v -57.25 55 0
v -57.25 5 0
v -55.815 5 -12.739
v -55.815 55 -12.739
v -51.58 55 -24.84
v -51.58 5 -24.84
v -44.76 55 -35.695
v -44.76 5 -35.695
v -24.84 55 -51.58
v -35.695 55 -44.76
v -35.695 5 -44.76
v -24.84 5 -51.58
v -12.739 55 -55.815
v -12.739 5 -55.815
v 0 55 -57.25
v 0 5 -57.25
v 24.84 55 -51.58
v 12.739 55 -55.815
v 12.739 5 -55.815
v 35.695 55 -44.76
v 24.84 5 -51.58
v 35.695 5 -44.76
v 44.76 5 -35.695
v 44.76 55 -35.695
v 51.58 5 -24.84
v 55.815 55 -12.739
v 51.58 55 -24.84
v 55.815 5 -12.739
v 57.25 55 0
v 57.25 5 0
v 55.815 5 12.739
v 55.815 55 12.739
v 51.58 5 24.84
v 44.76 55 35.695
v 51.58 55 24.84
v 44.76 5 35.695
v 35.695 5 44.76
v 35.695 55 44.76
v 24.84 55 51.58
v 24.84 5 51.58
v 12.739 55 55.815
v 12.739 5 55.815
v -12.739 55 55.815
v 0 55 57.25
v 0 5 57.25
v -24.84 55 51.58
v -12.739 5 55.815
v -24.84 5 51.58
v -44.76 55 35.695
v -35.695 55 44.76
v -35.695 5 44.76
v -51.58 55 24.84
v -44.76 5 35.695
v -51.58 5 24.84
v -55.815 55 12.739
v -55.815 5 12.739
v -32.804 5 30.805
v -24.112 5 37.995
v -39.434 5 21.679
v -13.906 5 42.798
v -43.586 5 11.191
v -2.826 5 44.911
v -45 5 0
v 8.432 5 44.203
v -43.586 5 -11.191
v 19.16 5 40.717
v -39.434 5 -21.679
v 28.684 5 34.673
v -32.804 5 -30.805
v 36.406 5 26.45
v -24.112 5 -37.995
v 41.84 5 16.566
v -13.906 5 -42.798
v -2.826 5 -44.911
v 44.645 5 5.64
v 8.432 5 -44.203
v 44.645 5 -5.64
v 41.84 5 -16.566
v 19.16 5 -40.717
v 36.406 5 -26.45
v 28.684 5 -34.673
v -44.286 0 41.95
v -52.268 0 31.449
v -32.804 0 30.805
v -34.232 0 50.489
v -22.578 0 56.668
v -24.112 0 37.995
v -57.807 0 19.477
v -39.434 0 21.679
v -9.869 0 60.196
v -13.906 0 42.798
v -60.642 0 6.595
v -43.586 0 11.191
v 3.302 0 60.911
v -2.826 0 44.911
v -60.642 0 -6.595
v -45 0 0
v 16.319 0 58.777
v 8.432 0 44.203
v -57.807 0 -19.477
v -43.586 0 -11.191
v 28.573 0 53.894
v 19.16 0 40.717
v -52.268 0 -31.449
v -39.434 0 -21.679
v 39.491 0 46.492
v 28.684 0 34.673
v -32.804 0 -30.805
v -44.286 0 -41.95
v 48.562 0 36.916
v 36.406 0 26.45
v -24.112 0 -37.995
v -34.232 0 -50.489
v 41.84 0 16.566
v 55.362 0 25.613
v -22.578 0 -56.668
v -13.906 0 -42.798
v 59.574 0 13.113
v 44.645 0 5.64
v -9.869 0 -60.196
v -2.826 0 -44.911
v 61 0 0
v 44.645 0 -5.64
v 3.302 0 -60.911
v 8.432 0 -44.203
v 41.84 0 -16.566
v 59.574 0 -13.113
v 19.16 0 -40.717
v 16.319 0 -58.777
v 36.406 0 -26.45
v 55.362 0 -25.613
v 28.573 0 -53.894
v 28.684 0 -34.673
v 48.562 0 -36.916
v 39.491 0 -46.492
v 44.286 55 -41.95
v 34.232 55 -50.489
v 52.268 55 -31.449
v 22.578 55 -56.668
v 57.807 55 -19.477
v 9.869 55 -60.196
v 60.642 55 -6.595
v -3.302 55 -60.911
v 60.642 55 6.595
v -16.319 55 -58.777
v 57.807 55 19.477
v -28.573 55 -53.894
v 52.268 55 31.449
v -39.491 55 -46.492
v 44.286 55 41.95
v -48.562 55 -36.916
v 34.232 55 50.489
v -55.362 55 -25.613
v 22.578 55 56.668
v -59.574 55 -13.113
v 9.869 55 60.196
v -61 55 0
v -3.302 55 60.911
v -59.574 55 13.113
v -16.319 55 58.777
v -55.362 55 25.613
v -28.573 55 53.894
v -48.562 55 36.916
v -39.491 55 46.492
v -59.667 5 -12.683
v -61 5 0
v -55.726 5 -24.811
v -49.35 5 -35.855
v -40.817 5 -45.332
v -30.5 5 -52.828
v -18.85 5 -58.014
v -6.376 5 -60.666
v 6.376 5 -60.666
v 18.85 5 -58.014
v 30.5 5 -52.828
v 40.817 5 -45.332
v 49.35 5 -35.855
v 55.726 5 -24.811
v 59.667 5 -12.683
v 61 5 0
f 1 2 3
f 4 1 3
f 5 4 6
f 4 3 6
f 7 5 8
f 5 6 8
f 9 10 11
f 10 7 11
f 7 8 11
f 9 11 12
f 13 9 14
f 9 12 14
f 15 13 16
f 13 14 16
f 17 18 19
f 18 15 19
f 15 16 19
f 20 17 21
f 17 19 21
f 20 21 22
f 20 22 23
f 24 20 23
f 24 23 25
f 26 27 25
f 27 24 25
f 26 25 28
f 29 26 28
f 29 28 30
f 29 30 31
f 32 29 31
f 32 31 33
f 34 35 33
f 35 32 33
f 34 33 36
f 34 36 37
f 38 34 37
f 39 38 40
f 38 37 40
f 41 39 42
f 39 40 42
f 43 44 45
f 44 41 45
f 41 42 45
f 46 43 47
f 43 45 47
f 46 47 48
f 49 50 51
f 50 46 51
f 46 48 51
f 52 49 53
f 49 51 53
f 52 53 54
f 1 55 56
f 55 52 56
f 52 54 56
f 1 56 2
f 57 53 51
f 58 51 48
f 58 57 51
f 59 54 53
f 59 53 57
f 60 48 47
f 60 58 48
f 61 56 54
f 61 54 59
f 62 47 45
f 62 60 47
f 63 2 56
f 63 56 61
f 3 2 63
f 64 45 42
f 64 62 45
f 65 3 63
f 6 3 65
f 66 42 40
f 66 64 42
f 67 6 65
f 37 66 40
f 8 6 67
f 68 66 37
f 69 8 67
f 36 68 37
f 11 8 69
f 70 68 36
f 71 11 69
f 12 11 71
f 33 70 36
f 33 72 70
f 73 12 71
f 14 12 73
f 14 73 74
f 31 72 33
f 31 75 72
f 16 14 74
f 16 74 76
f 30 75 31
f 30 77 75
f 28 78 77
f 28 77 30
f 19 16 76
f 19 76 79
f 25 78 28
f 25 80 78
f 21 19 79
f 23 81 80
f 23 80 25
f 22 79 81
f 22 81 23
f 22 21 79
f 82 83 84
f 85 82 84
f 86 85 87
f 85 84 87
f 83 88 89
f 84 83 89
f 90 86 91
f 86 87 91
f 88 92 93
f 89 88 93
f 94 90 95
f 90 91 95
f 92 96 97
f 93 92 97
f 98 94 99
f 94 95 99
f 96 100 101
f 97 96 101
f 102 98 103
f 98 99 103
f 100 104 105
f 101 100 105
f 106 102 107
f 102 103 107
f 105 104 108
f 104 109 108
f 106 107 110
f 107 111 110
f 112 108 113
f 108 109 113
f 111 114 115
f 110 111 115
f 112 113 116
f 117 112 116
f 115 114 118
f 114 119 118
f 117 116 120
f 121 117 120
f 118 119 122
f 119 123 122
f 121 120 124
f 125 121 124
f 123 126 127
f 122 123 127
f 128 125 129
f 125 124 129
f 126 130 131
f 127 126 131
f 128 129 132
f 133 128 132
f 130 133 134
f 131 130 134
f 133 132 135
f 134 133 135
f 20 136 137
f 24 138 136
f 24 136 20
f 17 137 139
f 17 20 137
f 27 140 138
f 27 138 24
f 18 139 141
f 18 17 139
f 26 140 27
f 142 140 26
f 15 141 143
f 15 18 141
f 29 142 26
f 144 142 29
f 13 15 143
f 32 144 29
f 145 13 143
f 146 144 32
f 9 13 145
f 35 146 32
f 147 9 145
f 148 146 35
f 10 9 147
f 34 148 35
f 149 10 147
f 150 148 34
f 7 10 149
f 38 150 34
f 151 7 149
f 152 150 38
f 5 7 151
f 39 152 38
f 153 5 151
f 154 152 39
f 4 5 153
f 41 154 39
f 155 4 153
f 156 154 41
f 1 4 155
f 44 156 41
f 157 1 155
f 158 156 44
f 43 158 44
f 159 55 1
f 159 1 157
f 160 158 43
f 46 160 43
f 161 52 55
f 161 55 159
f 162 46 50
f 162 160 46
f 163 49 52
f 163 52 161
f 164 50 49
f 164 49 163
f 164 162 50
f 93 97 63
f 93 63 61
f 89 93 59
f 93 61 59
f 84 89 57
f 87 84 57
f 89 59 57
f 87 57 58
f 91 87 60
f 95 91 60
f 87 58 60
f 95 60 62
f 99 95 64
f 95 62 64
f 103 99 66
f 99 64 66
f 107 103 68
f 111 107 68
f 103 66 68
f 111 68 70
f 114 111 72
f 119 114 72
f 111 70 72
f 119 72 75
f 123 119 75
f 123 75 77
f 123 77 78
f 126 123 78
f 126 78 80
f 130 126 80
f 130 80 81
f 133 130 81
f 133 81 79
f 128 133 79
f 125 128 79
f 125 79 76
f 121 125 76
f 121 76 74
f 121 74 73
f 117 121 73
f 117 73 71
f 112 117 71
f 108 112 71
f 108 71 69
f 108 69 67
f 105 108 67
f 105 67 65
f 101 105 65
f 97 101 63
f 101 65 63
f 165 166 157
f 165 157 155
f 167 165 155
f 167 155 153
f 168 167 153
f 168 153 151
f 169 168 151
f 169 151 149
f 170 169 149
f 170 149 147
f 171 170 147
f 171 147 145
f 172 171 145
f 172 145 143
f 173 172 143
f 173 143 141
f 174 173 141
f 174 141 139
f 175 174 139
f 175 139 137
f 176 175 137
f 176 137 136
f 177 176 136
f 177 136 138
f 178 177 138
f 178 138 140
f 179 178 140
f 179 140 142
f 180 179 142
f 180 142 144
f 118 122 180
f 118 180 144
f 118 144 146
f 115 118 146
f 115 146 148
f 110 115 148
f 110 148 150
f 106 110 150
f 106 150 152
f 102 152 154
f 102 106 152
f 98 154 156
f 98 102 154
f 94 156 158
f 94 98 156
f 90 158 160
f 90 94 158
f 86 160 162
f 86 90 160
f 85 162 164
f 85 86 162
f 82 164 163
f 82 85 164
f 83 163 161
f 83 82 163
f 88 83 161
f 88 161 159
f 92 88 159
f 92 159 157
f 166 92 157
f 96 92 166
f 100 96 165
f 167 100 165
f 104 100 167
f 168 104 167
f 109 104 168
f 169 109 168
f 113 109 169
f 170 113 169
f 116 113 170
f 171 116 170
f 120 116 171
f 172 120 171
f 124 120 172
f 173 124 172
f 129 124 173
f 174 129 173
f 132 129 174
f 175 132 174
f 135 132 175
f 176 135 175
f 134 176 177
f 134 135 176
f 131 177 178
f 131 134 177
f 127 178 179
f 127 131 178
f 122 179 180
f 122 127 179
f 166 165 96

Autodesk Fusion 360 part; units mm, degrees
sketch "Sketch1" plane through (0, 0, 0) normal (0, 1, 0) x (1, 0, 0)
  circle A0 centre (0, 0) radius 61
  dimension "d2" = 122
extrude "Extrude1" add sketch "Sketch1" along normal blind 5
sketch "Sketch3" plane through (0, 5, 0) normal (0, 1, 0) x (-1, 0, 0)
  circle A0 centre (0, 0) radius 61
  circle A1 centre (0, 0) radius 61
  circle A2 centre (0, 0) radius 57.25
  dimension "d5" = 114.5
extrude "Extrude2" add sketch "Sketch3" along normal blind 50
sketch "Sketch4" plane through (0, 5, 0) normal (0, 1, 0) x (-1, 0, 0)
  circle A0 centre (0, 0) radius 57.25
  circle A1 centre (0, 0) radius 45
  dimension "d8" = 90
extrude "Extrude3" cut sketch "Sketch4" against normal blind 55 contours A1
